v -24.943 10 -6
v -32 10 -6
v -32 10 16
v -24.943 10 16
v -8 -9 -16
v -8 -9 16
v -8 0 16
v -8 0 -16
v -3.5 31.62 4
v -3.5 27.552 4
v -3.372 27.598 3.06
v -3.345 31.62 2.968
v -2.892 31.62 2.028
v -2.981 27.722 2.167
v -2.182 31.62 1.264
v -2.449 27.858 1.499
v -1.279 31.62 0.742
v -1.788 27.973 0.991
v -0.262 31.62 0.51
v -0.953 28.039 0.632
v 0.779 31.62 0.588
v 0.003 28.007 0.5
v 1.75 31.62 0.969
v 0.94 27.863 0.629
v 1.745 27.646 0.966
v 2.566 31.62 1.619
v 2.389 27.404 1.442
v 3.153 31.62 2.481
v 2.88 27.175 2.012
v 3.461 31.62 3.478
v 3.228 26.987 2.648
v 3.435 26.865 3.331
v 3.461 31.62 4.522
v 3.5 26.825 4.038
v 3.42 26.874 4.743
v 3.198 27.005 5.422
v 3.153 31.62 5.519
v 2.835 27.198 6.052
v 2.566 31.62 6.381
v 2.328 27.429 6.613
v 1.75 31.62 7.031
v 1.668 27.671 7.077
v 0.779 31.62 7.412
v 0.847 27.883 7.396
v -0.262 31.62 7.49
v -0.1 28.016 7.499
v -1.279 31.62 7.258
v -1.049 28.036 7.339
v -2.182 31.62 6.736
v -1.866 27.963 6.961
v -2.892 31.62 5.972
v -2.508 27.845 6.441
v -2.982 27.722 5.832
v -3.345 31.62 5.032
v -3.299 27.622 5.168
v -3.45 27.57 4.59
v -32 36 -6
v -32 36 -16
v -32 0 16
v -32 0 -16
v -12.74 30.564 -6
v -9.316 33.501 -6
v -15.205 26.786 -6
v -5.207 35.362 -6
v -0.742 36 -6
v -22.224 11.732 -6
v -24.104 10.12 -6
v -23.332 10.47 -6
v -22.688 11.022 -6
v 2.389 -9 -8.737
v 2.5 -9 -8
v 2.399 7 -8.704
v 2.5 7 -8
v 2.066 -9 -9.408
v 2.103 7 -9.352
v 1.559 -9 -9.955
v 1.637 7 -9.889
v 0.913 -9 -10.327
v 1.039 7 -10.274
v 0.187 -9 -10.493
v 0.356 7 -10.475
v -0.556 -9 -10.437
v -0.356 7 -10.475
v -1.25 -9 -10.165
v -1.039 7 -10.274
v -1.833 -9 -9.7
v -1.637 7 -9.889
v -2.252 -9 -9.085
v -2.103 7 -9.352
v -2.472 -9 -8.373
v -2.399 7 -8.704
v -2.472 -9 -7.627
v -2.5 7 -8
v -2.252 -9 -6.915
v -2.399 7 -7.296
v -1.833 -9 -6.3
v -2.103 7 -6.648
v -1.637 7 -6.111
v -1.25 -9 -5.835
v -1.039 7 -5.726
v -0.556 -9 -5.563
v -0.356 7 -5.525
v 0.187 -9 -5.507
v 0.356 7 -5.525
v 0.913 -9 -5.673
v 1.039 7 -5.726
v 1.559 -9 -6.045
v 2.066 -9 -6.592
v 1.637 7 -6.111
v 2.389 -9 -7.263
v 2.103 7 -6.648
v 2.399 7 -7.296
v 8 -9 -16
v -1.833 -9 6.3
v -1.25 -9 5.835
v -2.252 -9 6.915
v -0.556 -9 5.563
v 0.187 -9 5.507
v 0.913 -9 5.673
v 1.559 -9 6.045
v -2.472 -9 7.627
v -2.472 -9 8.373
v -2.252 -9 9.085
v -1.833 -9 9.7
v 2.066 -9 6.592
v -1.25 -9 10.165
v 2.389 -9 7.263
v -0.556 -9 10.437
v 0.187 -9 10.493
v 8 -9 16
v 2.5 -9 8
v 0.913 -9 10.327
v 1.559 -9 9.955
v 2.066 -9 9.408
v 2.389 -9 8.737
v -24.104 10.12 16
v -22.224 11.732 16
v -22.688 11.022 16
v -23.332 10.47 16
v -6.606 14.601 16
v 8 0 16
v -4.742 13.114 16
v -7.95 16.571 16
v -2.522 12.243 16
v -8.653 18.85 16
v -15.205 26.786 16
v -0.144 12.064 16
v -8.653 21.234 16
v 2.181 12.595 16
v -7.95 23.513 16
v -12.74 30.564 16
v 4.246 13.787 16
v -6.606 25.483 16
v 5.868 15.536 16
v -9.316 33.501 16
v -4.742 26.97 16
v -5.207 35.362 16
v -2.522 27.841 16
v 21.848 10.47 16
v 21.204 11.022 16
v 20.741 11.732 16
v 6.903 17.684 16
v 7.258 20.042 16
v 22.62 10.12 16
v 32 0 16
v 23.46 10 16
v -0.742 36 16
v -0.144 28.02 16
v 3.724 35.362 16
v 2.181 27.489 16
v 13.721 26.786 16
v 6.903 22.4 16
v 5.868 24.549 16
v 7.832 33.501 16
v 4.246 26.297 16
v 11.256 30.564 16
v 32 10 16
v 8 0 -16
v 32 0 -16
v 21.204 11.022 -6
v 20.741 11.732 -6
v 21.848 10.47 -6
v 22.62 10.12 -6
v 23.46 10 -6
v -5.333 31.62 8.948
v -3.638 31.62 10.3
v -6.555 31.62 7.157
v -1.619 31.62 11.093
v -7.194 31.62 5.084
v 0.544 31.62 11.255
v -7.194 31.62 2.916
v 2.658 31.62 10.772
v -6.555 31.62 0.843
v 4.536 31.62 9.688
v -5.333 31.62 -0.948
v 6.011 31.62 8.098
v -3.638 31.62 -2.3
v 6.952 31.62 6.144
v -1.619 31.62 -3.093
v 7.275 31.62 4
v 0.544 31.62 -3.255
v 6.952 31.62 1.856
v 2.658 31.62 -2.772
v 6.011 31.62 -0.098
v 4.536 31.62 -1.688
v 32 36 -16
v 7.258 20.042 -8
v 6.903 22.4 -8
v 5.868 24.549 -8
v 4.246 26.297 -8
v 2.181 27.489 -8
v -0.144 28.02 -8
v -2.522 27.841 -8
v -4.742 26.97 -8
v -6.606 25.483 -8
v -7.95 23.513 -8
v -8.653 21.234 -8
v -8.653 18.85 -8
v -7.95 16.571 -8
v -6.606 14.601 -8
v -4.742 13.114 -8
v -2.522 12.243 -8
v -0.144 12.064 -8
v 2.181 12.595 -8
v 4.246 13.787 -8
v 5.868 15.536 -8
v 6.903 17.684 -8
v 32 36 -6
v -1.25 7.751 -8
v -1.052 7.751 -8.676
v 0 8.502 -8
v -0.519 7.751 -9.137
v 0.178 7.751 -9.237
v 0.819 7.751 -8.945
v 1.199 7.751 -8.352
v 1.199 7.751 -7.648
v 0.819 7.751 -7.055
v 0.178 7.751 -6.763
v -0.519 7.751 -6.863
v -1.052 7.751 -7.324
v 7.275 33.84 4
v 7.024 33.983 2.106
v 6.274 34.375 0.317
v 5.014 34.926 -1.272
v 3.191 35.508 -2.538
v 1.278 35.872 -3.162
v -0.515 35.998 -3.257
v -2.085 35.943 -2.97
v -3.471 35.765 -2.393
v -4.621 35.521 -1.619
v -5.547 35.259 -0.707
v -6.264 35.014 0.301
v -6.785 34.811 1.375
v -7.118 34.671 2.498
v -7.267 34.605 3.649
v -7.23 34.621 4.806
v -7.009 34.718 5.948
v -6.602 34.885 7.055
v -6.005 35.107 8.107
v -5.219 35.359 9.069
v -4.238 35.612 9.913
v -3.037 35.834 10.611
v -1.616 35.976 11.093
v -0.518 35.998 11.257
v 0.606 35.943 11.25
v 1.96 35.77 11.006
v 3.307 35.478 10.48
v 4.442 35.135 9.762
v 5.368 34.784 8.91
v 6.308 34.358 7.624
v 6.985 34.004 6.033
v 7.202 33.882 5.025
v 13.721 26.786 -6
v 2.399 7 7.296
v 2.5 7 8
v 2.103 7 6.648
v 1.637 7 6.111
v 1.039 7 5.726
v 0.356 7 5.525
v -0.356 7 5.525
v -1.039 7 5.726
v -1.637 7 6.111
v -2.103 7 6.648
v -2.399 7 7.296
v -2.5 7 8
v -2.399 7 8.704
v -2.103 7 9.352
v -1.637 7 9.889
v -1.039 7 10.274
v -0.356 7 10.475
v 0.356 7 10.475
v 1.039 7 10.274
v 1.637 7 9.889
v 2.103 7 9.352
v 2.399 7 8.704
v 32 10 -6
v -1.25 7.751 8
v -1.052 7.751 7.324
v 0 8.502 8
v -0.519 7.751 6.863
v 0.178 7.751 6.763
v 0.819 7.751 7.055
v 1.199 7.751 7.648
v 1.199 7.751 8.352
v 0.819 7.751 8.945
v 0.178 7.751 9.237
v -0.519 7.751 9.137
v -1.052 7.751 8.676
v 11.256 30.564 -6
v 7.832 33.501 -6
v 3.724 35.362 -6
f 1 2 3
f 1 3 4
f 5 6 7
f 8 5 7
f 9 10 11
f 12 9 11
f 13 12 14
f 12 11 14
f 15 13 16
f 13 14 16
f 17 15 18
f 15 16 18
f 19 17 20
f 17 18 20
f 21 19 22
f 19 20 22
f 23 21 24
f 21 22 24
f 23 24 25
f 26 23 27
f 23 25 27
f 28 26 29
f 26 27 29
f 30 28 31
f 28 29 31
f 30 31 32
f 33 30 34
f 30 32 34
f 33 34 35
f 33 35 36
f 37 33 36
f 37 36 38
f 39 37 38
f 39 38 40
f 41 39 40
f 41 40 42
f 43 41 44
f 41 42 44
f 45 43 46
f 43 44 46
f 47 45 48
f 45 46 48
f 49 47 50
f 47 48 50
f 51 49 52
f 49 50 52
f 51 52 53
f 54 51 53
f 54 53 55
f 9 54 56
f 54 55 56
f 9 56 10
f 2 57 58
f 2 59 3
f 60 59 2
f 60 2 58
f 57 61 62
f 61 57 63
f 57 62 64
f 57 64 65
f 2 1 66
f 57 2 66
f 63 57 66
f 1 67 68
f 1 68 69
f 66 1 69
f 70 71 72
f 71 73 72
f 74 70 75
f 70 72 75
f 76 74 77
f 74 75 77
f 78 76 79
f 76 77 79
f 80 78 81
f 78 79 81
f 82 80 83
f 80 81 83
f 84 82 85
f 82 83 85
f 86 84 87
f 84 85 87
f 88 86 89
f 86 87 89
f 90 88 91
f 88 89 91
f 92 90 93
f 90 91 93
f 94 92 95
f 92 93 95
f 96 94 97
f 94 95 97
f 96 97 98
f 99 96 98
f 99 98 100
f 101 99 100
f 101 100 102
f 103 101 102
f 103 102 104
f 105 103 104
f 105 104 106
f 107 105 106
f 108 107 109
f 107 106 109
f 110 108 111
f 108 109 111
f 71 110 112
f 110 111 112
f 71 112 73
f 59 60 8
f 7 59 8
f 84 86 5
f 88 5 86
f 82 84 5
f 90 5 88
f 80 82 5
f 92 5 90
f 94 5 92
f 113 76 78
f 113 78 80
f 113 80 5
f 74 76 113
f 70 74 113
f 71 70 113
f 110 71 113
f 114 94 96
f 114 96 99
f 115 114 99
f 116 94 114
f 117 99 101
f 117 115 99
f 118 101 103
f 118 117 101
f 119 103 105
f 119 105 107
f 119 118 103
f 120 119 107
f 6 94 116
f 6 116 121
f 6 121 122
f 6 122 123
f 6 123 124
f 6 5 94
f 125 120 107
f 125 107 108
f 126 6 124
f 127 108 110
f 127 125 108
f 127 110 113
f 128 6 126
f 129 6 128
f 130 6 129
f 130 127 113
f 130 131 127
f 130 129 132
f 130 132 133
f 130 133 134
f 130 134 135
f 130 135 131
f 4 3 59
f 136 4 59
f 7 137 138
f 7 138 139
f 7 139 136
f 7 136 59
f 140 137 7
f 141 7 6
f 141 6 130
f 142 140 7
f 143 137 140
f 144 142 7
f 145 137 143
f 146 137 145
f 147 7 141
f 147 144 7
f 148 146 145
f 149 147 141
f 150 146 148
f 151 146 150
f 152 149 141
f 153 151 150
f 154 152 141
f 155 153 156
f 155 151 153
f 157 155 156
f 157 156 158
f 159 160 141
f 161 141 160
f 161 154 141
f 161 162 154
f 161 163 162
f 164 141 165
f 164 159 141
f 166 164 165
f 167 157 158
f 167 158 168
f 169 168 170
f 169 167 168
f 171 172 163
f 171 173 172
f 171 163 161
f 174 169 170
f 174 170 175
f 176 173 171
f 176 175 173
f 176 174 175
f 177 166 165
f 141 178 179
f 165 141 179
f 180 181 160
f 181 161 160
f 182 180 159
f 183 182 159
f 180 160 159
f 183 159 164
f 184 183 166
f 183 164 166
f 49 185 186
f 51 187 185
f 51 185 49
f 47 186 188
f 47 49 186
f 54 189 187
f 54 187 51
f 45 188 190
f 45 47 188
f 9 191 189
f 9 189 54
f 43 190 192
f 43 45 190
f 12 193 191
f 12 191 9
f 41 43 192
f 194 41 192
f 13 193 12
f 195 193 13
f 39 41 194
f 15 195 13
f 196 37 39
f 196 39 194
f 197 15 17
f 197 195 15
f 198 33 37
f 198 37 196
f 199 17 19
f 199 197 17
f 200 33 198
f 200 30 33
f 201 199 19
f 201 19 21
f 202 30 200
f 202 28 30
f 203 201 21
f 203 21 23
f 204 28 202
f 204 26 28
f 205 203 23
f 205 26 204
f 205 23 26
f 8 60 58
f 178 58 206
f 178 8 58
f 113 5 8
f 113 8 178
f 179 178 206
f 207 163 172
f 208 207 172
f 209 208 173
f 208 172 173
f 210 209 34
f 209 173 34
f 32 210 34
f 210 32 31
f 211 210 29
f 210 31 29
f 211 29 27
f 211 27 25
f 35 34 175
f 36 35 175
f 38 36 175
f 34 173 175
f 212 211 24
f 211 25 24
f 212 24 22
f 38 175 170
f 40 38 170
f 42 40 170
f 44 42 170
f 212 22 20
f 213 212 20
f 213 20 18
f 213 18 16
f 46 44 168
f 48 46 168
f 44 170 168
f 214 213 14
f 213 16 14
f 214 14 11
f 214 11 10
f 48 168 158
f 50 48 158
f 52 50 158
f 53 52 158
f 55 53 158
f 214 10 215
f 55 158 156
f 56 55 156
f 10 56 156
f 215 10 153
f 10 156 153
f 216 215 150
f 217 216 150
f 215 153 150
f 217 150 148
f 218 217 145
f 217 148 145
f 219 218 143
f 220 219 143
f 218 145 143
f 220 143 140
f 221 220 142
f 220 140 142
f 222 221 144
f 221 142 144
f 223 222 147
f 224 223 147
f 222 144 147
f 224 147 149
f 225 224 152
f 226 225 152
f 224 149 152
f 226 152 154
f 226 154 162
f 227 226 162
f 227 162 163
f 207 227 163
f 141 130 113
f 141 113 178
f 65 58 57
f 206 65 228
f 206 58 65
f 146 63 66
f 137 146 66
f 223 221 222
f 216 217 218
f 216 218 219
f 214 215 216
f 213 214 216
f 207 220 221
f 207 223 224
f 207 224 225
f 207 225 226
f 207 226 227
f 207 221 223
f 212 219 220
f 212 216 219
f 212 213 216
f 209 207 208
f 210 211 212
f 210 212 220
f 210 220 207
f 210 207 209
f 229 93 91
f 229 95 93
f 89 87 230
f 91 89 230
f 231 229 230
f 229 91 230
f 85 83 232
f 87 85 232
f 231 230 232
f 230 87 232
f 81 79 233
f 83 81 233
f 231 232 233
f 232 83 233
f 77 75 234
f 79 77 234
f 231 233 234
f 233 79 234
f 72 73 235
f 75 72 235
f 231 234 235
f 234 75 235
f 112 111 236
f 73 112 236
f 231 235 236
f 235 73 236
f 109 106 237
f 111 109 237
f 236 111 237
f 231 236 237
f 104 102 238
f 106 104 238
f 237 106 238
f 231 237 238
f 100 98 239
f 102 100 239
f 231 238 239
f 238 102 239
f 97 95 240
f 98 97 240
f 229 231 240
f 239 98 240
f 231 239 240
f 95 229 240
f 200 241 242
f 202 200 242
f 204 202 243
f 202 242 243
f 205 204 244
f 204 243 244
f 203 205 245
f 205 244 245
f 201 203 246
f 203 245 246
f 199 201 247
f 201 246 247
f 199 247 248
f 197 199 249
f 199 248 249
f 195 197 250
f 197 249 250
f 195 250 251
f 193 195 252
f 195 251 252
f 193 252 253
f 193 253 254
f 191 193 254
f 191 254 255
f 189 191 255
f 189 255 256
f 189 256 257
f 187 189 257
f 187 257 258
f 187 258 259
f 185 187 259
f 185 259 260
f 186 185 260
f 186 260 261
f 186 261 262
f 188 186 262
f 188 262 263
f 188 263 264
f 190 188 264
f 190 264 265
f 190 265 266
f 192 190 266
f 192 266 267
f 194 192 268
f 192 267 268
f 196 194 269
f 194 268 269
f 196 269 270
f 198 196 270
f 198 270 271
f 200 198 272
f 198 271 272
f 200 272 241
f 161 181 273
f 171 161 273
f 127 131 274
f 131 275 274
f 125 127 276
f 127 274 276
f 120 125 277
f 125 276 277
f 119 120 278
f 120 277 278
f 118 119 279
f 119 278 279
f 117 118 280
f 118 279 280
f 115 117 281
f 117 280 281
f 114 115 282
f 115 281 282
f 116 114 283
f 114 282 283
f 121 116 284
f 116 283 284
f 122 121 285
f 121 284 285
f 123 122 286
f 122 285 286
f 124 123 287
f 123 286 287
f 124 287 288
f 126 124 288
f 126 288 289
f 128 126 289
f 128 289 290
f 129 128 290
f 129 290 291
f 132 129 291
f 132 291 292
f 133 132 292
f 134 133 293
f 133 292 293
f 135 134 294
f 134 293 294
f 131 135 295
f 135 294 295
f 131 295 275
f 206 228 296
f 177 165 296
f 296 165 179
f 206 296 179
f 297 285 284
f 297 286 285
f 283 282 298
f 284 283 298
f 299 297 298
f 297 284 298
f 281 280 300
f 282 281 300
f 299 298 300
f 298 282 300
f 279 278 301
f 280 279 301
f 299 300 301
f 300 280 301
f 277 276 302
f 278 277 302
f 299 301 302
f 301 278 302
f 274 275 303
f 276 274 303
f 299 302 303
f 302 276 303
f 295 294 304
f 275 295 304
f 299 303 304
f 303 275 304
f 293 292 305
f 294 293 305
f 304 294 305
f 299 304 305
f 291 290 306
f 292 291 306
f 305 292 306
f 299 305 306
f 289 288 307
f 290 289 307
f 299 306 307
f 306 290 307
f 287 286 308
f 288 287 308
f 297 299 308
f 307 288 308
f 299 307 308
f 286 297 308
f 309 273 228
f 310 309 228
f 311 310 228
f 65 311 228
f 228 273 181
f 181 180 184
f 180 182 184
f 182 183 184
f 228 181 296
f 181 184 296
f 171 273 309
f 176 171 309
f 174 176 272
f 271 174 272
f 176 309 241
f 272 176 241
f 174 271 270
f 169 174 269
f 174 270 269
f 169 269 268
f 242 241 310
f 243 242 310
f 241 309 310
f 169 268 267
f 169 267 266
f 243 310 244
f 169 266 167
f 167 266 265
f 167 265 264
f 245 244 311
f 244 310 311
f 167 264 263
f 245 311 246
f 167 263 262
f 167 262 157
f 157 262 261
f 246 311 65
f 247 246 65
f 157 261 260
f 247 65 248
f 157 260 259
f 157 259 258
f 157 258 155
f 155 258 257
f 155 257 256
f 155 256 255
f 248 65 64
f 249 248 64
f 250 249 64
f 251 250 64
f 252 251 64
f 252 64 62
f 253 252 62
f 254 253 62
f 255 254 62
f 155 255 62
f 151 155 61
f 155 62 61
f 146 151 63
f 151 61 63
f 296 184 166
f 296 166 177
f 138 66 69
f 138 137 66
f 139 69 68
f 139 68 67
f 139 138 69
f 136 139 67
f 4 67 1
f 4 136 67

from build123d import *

# Parameters (mm, degrees)
SKETCH1_W                               = 64
SKETCH1_H                               = 32
BOSS_EXTRUDE1_DEPTH                     = 10
SKETCH4_W                               = 64
SKETCH4_H                               = 10
BOSS_EXTRUDE3_DEPTH                     = 26
BOSS_EXTRUDE4_DEPTH                     = 22
FILLET1_R                               = 3
SKETCH6_W                               = 16
SKETCH6_H                               = 9
BOSS_EXTRUDE5_DEPTH                     = 32
CBORE_FOR_M6_HEX_HEAD_BOLT1_D           = 7
CBORE_FOR_M6_HEX_HEAD_BOLT1_DEPTH       = 15
CBORE_FOR_M6_HEX_HEAD_BOLT1_CBORE_D     = 14.55
CBORE_FOR_M6_HEX_HEAD_BOLT1_CBORE_DEPTH = 4.38
CBORE_FOR_M6_HEX_HEAD_BOLT1_TIP         = 2.103012167
SKETCH12_R                              = 8
CUT_EXTRUDE1_DEPTH                      = 24
TAP_DRILL_FOR_M6X1_0_TAP1_D             = 5
TAP_DRILL_FOR_M6X1_0_TAP1_DEPTH         = 16
TAP_DRILL_FOR_M6X1_0_TAP1_TIP           = 1.502151548


with BuildPart() as part:
    # Sketch1 → Boss-Extrude1 (new body)
    with BuildSketch(Plane(origin=(0, 0, 0), x_dir=(1, 0, 0), z_dir=(0, 1, 0))):
        Rectangle(SKETCH1_W, SKETCH1_H)
    extrude(amount=BOSS_EXTRUDE1_DEPTH)

    # Sketch4 → Boss-Extrude3 (add)
    with BuildSketch(Plane(origin=(0, 10, 0), x_dir=(1, 0, 0), z_dir=(0, 1, 0))):
        with Locations((0, 11)):
            Rectangle(SKETCH4_W, SKETCH4_H)
    extrude(amount=BOSS_EXTRUDE3_DEPTH)

    # Sketch5 → Boss-Extrude4 (add)
    with BuildSketch(Plane.XY.offset(-6)):
        with BuildLine():
            Line((-15.204681896, 26.786179615), (-23.032206002, 10))
            Line((-23.032206002, 10), (21.548444147, 10))
            Line((21.548444147, 10), (13.720920041, 26.786179615))
            ThreePointArc((13.720920041, 26.786179615), (-0.741880927, 36), (-15.204681896, 26.786179615))
        make_face()
    extrude(amount=BOSS_EXTRUDE4_DEPTH)

    # Fillet1
    fillet1_edges = [part.edges().sort_by_distance(p)[0] for p in [
        (21.548444147, 10, 5),
        (-23.032206002, 10, 5),
    ]]
    fillet(fillet1_edges, radius=FILLET1_R)

    # Sketch6 → Boss-Extrude5 (add)
    with BuildSketch(Plane.XY.offset(16)):
        with Locations((0, -4.5)):
            Rectangle(SKETCH6_W, SKETCH6_H)
    extrude(amount=-BOSS_EXTRUDE5_DEPTH)

    # CBORE for M6 Hex Head Bolt1
    with Locations(Plane(origin=(0, 36, 0), x_dir=(1, 0, 0), z_dir=(0, 1, 0))):
        with Locations((0, -4)):
            CounterBoreHole(CBORE_FOR_M6_HEX_HEAD_BOLT1_D / 2, CBORE_FOR_M6_HEX_HEAD_BOLT1_CBORE_D / 2, CBORE_FOR_M6_HEX_HEAD_BOLT1_CBORE_DEPTH, depth=CBORE_FOR_M6_HEX_HEAD_BOLT1_DEPTH)
            with Locations((0, 0, -(CBORE_FOR_M6_HEX_HEAD_BOLT1_DEPTH + CBORE_FOR_M6_HEX_HEAD_BOLT1_TIP / 2))):  # 118° drill point
                Cone(0, CBORE_FOR_M6_HEX_HEAD_BOLT1_D / 2, CBORE_FOR_M6_HEX_HEAD_BOLT1_TIP, mode=Mode.SUBTRACT)

    # Sketch12 → Cut-Extrude1 (cut)
    with BuildSketch(Plane.XY.offset(16)):
        with Locations((-0.741880927, 20.042064765)):
            Circle(SKETCH12_R)
    extrude(amount=-CUT_EXTRUDE1_DEPTH, mode=Mode.SUBTRACT)

    # Tap Drill for M6x1.0 Tap1
    with Locations(Plane(origin=(0, -9, 0), x_dir=(-1, 0, 0), z_dir=(0, -1, 0))):
        with Locations((0, -8), (0, 8)):
            Hole(TAP_DRILL_FOR_M6X1_0_TAP1_D / 2, depth=TAP_DRILL_FOR_M6X1_0_TAP1_DEPTH)
            with Locations((0, 0, -(TAP_DRILL_FOR_M6X1_0_TAP1_DEPTH + TAP_DRILL_FOR_M6X1_0_TAP1_TIP / 2))):  # 118° drill point
                Cone(0, TAP_DRILL_FOR_M6X1_0_TAP1_D / 2, TAP_DRILL_FOR_M6X1_0_TAP1_TIP, mode=Mode.SUBTRACT)


solid = part.part
